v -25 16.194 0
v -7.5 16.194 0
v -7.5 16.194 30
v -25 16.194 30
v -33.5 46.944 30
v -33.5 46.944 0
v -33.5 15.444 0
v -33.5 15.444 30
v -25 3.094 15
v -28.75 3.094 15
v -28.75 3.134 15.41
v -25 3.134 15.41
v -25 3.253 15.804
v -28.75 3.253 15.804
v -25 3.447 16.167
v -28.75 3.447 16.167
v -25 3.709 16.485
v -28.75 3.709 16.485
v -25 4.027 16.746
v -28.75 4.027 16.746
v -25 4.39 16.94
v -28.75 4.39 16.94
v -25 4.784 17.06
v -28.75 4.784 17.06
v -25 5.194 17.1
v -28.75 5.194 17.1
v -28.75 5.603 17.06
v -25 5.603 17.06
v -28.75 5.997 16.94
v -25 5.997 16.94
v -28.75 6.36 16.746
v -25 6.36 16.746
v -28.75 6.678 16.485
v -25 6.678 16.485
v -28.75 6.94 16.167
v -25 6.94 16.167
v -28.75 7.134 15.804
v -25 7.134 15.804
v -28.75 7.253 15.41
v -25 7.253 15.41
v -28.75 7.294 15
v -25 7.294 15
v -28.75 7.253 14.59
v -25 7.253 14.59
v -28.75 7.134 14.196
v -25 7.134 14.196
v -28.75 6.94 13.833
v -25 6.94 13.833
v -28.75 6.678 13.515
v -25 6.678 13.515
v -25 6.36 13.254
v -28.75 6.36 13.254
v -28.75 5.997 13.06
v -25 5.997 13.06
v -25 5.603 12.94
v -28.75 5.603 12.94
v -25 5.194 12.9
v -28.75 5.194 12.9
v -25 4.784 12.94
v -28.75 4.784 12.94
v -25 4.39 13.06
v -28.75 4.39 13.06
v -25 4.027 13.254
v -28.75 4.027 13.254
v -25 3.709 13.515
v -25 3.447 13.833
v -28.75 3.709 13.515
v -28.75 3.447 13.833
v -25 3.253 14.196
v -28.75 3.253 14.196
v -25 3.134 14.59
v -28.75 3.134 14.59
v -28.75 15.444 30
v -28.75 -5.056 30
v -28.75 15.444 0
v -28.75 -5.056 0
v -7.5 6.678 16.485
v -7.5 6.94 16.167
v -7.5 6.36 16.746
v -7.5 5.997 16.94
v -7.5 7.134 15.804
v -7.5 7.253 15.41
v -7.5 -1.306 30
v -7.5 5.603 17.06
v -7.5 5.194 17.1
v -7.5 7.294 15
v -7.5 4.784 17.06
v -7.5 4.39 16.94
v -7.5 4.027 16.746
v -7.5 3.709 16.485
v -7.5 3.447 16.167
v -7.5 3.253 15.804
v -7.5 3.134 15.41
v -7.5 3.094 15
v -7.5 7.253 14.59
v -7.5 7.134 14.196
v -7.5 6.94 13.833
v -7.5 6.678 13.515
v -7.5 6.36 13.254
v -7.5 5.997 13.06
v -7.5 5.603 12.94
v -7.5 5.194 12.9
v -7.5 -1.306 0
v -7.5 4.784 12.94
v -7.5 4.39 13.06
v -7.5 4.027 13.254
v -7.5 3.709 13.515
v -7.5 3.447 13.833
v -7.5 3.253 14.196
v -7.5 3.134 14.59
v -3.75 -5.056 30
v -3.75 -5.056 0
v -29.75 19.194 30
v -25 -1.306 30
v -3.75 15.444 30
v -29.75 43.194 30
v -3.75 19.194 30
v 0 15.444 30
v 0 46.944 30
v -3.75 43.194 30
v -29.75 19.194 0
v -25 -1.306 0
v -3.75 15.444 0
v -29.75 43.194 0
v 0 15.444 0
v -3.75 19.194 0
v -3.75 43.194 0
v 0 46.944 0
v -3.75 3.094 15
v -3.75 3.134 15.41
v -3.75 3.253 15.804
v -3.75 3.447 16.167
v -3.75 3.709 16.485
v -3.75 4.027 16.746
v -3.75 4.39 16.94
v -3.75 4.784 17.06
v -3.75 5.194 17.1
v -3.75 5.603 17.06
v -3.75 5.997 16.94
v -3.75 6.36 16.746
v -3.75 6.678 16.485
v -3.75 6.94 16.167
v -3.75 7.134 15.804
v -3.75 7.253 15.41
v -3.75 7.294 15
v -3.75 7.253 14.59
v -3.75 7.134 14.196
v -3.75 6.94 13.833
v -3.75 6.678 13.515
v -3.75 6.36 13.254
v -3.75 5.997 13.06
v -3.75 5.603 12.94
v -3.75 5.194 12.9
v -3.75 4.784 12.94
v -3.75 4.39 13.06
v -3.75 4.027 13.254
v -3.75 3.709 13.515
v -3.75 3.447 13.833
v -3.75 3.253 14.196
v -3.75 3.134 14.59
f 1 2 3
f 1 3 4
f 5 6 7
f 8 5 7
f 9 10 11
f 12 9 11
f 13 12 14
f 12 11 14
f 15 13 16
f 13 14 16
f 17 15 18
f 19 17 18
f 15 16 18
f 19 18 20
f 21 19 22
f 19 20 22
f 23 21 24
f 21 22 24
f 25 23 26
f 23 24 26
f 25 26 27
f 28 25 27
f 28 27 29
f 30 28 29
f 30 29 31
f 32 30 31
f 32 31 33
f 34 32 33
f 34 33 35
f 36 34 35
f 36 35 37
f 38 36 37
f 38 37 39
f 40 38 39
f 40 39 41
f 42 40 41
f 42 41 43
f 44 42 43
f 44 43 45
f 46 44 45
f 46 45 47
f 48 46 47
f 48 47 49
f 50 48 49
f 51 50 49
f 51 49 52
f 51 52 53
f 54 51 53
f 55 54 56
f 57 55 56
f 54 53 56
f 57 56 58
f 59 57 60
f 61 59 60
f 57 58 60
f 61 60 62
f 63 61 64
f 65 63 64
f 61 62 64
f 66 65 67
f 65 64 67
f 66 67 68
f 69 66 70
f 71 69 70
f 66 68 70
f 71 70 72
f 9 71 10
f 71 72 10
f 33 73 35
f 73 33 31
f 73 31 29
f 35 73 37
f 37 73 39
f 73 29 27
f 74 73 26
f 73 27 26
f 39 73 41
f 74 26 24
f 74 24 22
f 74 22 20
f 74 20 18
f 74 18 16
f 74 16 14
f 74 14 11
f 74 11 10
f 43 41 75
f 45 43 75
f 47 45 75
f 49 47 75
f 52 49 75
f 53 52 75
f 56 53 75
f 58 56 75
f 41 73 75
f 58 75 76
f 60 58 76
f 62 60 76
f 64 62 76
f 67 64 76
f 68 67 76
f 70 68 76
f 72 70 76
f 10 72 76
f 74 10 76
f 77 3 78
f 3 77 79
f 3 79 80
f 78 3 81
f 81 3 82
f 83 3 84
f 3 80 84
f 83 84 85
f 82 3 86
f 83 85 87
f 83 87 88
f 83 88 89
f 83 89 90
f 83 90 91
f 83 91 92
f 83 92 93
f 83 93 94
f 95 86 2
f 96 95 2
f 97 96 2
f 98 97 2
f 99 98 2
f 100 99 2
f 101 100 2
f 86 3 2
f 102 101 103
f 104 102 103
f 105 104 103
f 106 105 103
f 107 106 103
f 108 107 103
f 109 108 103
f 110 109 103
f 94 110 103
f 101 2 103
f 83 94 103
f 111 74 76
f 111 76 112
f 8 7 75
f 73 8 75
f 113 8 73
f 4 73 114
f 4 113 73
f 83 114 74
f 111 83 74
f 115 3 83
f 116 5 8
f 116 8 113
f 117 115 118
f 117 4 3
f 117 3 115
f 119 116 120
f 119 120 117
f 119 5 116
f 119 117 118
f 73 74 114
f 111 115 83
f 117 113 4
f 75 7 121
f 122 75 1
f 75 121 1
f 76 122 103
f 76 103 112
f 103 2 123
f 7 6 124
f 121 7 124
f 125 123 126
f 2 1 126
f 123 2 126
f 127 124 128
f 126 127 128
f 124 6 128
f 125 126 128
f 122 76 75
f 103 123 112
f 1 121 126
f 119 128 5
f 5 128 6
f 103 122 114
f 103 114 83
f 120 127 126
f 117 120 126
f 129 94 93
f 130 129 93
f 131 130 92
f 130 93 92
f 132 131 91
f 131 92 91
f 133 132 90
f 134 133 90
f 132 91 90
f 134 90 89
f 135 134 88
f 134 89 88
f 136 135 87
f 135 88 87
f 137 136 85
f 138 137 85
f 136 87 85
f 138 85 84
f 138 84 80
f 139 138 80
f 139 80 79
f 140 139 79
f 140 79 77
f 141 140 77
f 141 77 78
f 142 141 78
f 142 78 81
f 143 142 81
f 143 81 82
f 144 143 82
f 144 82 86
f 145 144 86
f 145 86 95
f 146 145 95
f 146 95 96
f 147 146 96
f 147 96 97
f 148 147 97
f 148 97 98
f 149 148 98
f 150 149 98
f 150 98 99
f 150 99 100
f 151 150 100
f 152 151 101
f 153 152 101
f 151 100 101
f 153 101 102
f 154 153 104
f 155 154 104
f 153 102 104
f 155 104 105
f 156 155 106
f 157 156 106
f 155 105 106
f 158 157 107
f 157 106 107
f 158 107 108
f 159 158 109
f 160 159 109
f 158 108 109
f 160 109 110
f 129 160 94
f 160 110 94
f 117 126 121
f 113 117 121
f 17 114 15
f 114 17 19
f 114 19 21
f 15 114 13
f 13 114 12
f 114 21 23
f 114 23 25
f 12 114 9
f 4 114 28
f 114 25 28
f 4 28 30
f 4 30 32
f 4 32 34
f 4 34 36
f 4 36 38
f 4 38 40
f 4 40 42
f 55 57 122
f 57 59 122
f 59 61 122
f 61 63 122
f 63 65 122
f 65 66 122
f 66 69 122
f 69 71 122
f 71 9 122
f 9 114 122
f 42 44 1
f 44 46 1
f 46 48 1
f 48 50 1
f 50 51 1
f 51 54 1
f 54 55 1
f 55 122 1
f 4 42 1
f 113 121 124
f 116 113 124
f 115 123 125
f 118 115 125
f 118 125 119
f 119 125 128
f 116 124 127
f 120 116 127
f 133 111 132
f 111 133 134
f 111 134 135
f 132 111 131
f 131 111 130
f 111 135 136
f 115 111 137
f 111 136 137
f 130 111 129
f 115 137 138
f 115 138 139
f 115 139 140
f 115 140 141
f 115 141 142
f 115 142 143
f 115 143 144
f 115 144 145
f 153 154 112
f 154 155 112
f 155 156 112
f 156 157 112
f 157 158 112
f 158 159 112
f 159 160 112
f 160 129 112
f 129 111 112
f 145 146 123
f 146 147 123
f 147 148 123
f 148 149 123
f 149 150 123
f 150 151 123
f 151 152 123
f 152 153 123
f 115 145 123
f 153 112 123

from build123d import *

# Parameters (mm, degrees)
RESSALTO_EXTRUS_O2_DEPTH = 30
ESBO_O2_R                = 2.1
CORTE_EXTRUS_O1_DEPTH    = 63.691779646


with BuildPart() as part:
    # Esboço1 → Ressalto-extrusão2 (new body)
    with BuildSketch(Plane.XY):
        Polygon((-28.75, 15.443548387), (-28.75, -5.056451613), (-3.75, -5.056451613), (-3.75, 15.443548387), (0, 15.443548387), (0, 46.943548387), (-33.5, 46.943548387), (-33.5, 15.443548387), align=None)
        Polygon((-25, 15.443548387), (-25, -1.306451613), (-7.5, -1.306451613), (-7.5, 15.443548387), (-7.5, 16.193548387), (-25, 16.193548387), align=None, mode=Mode.SUBTRACT)
        Polygon((-25, 19.193548387), (-29.75, 19.193548387), (-29.75, 43.193548387), (-3.75, 43.193548387), (-3.75, 19.193548387), (-7.5, 19.193548387), align=None, mode=Mode.SUBTRACT)
    extrude(amount=RESSALTO_EXTRUS_O2_DEPTH)

    # Esboço2 → Corte-extrusão1 (cut, through all)
    with BuildSketch(Plane.ZY.offset(28.75)):
        with Locations(Location((15, 5.193548387, 0), (0, 0, 270))):
            Circle(ESBO_O2_R)
    extrude(amount=-CORTE_EXTRUS_O1_DEPTH, mode=Mode.SUBTRACT)


solid = part.part
